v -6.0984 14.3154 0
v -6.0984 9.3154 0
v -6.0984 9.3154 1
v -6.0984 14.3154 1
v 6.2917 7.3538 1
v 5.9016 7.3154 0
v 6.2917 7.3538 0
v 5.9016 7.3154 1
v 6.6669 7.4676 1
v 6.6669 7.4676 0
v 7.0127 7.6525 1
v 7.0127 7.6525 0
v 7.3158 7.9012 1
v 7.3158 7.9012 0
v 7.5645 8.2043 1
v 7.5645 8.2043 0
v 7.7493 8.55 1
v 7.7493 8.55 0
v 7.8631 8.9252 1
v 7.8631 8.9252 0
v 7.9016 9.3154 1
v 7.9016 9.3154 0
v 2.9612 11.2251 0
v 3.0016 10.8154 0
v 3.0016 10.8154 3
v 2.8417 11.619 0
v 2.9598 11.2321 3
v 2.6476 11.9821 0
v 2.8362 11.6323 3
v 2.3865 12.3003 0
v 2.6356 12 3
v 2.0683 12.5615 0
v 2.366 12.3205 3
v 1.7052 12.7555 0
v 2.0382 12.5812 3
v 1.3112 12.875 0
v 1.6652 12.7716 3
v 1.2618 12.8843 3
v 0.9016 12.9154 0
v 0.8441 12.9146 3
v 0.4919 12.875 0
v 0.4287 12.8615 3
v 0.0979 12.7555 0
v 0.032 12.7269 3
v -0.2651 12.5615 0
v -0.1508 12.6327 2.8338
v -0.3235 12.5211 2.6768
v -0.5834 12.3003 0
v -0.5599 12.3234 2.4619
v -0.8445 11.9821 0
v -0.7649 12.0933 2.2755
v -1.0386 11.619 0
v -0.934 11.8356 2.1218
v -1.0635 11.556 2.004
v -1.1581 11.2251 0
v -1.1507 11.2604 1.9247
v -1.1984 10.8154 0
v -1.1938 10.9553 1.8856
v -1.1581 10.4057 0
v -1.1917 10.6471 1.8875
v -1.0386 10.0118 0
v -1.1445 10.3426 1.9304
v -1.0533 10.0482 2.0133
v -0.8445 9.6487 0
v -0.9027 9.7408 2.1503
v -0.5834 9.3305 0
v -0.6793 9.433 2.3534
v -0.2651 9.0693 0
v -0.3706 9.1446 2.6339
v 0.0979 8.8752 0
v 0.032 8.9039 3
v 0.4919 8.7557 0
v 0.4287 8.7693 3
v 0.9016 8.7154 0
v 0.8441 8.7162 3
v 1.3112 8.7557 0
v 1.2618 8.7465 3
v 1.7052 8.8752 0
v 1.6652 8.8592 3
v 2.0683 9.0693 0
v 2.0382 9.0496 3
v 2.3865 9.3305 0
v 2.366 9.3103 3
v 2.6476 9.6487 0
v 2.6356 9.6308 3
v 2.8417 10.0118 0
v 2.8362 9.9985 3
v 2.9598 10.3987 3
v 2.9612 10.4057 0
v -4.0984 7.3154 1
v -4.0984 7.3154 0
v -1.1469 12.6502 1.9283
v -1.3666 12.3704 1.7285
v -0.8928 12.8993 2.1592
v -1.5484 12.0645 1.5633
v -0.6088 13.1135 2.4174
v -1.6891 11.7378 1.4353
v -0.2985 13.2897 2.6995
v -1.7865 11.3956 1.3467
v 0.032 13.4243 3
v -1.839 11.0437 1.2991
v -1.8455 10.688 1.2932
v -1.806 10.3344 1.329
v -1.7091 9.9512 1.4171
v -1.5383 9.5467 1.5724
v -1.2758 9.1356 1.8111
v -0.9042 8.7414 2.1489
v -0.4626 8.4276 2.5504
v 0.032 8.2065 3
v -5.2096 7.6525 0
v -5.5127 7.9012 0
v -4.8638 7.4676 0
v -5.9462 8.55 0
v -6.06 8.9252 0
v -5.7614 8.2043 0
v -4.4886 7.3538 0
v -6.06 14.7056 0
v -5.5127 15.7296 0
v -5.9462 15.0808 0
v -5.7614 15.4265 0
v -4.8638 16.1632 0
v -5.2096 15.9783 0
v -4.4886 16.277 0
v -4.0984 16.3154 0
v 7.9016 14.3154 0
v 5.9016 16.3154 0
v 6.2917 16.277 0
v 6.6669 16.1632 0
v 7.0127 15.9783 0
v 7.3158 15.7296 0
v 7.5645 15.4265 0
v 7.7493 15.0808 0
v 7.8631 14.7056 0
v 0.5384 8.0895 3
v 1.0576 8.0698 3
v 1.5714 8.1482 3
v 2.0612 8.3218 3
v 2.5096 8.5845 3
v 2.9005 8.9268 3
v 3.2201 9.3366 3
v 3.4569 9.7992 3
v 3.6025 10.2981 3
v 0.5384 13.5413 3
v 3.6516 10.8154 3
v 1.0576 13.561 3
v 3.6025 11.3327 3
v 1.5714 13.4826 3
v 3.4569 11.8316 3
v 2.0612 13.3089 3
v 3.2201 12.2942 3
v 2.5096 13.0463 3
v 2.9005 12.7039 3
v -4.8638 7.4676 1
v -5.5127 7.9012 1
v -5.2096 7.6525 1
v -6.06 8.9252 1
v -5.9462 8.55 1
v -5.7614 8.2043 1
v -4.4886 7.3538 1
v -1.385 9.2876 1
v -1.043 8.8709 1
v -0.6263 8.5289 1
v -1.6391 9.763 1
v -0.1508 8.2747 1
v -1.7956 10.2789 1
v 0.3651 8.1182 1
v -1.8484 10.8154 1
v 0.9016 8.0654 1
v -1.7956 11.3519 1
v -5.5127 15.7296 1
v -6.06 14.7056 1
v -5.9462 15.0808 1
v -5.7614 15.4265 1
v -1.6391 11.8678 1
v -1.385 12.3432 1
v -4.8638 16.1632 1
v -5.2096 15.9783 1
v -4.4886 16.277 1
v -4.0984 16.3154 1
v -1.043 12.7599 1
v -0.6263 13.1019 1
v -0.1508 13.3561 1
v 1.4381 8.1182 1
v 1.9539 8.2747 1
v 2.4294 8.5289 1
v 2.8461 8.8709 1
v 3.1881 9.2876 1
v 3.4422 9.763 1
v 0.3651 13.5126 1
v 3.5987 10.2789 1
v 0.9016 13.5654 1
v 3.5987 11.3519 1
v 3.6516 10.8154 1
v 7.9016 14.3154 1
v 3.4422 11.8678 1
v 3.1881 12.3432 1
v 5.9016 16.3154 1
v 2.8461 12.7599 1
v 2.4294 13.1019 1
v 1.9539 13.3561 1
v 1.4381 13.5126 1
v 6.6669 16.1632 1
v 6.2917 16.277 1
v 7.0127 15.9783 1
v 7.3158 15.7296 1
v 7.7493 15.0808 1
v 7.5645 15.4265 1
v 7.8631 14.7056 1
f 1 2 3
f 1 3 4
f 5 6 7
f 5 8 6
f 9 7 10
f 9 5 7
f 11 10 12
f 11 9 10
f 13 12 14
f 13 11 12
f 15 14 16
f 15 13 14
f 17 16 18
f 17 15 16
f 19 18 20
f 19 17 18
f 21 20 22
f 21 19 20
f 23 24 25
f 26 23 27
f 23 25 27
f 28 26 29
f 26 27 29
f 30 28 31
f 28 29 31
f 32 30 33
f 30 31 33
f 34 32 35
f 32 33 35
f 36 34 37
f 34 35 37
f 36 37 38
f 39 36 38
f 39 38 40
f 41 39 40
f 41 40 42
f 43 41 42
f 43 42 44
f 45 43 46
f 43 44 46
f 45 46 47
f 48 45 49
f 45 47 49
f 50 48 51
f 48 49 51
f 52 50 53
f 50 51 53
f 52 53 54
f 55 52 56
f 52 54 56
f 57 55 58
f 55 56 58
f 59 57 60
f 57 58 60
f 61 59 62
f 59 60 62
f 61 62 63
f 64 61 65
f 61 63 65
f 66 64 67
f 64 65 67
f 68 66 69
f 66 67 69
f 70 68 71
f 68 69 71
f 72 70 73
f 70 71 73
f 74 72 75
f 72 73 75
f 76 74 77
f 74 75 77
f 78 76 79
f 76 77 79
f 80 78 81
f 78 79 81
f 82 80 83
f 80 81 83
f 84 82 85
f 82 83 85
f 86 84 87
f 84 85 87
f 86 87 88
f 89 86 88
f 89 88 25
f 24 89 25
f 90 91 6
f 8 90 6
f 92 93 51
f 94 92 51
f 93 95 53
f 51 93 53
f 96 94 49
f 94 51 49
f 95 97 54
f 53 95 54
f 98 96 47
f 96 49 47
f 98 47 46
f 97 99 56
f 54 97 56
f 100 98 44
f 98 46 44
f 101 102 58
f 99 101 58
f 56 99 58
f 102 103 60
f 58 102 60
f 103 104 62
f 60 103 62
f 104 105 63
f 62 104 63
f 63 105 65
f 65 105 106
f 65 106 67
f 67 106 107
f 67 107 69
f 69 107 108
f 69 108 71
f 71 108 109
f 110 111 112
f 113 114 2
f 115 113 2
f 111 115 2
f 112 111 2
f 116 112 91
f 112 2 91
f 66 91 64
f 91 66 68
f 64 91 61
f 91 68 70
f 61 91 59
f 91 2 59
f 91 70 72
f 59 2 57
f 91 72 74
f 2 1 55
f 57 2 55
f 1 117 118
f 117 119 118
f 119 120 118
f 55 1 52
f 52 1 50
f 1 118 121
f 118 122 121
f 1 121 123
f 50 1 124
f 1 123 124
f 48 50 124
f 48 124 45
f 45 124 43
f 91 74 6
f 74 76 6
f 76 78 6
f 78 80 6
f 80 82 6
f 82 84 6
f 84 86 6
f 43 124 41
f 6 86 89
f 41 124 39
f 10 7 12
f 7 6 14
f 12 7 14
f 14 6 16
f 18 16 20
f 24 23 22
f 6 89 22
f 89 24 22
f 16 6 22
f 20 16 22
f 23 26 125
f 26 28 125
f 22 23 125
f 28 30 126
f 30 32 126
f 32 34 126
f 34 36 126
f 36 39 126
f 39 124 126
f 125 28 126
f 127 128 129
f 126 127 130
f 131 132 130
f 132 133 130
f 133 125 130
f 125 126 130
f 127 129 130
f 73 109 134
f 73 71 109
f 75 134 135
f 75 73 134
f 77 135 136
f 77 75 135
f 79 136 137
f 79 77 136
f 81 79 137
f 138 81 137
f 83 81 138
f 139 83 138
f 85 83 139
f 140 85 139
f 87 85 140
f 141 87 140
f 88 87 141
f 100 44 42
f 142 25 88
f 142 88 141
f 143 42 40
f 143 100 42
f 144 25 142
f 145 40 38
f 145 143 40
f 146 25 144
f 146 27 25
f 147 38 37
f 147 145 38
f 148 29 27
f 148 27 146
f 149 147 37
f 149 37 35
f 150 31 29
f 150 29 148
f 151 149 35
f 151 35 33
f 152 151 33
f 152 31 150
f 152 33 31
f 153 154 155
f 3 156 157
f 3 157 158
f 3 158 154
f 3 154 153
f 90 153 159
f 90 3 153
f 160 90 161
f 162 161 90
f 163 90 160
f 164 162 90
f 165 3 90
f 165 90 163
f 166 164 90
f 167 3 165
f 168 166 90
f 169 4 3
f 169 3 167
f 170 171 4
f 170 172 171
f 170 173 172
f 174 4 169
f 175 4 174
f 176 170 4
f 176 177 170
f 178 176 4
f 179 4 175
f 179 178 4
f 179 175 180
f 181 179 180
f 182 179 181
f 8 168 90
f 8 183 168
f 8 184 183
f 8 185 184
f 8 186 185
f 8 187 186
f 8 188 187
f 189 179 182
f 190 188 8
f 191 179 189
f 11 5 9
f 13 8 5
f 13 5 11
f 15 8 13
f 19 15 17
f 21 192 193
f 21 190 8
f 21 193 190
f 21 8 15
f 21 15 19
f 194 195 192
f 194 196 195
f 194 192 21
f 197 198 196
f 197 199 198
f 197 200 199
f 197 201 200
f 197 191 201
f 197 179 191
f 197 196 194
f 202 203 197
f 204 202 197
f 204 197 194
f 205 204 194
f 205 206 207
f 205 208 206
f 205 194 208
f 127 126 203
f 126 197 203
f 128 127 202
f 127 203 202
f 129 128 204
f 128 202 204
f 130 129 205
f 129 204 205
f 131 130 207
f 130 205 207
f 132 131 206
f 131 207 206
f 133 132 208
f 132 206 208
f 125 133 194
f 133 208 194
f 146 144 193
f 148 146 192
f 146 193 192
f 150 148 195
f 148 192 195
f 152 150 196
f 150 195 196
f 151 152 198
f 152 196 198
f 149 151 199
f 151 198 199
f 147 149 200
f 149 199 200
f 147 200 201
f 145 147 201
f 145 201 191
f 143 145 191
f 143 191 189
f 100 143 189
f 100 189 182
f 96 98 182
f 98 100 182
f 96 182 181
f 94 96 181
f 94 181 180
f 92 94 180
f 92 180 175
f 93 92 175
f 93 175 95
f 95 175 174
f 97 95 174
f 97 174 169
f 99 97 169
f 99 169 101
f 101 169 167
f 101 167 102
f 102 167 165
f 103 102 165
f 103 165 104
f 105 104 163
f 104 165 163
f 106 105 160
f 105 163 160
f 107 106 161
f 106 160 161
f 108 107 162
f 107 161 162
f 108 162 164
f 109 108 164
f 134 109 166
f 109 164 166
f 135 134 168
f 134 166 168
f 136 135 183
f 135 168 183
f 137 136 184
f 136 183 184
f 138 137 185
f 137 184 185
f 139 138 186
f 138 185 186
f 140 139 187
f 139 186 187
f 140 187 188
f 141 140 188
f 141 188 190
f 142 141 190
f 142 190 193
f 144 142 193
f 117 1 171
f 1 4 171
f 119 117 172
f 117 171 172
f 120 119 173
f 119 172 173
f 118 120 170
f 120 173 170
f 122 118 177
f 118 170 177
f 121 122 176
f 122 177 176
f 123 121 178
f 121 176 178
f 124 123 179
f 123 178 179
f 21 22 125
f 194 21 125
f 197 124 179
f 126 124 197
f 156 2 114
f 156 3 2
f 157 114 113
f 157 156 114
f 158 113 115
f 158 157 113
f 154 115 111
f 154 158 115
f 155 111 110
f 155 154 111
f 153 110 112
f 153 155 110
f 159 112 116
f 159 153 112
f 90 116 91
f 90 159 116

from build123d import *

# Parameters (mm, degrees)
F0_W      = 14
F0_H      = 9
F1_DEPTH  = 1
F2_R      = 2.75
F2_R_2    = 2.1
F3_DEPTH  = 2
F3_FACE_R = 2.1
F4_DEPTH  = 1.5
F5_R      = 2
F7_DEPTH  = 25


with BuildPart() as f1:
    # F0 (on Top) → F1 (new body)
    with BuildSketch(Plane.XY):
        with Locations((0.901556, 11.815395)):
            Rectangle(F0_W, F0_H)
    extrude(amount=F1_DEPTH)

    # F2 (on face) → F3 (join)
    with BuildSketch(Plane.XY.offset(1)):
        with Locations((0.901556, 10.815395)):
            Circle(F2_R)
        with Locations((0.901556, 10.815395)):
            Circle(F2_R_2, mode=Mode.SUBTRACT)
    extrude(amount=F3_DEPTH)

    # F3_face (on face) → F4 (cut)
    with BuildSketch(Plane(origin=(0.901556, 10.815395, 1), x_dir=(1, 0, 0), z_dir=(0, 0, 1))):
        Circle(F3_FACE_R)
    extrude(amount=-F4_DEPTH, mode=Mode.SUBTRACT)

    # F5
    f5_edges = [f1.edges().sort_by_distance(p)[0] for p in [
        (-6.098444, 7.315395, 0.5),
        (-6.098444, 16.315395, 0.5),
        (7.901556, 7.315395, 0.5),
        (7.901556, 16.315395, 0.5),
    ]]
    fillet(f5_edges, radius=F5_R)

    # F6 (on face) → F7 (cut)
    with BuildSketch(Plane.XZ.offset(-7.315395)):
        Polygon((0.521946, 3.445374), (-2.167966, 3.445374), (-2.167966, 1), align=None)
    extrude(amount=-F7_DEPTH, mode=Mode.SUBTRACT)


solid = f1.part
